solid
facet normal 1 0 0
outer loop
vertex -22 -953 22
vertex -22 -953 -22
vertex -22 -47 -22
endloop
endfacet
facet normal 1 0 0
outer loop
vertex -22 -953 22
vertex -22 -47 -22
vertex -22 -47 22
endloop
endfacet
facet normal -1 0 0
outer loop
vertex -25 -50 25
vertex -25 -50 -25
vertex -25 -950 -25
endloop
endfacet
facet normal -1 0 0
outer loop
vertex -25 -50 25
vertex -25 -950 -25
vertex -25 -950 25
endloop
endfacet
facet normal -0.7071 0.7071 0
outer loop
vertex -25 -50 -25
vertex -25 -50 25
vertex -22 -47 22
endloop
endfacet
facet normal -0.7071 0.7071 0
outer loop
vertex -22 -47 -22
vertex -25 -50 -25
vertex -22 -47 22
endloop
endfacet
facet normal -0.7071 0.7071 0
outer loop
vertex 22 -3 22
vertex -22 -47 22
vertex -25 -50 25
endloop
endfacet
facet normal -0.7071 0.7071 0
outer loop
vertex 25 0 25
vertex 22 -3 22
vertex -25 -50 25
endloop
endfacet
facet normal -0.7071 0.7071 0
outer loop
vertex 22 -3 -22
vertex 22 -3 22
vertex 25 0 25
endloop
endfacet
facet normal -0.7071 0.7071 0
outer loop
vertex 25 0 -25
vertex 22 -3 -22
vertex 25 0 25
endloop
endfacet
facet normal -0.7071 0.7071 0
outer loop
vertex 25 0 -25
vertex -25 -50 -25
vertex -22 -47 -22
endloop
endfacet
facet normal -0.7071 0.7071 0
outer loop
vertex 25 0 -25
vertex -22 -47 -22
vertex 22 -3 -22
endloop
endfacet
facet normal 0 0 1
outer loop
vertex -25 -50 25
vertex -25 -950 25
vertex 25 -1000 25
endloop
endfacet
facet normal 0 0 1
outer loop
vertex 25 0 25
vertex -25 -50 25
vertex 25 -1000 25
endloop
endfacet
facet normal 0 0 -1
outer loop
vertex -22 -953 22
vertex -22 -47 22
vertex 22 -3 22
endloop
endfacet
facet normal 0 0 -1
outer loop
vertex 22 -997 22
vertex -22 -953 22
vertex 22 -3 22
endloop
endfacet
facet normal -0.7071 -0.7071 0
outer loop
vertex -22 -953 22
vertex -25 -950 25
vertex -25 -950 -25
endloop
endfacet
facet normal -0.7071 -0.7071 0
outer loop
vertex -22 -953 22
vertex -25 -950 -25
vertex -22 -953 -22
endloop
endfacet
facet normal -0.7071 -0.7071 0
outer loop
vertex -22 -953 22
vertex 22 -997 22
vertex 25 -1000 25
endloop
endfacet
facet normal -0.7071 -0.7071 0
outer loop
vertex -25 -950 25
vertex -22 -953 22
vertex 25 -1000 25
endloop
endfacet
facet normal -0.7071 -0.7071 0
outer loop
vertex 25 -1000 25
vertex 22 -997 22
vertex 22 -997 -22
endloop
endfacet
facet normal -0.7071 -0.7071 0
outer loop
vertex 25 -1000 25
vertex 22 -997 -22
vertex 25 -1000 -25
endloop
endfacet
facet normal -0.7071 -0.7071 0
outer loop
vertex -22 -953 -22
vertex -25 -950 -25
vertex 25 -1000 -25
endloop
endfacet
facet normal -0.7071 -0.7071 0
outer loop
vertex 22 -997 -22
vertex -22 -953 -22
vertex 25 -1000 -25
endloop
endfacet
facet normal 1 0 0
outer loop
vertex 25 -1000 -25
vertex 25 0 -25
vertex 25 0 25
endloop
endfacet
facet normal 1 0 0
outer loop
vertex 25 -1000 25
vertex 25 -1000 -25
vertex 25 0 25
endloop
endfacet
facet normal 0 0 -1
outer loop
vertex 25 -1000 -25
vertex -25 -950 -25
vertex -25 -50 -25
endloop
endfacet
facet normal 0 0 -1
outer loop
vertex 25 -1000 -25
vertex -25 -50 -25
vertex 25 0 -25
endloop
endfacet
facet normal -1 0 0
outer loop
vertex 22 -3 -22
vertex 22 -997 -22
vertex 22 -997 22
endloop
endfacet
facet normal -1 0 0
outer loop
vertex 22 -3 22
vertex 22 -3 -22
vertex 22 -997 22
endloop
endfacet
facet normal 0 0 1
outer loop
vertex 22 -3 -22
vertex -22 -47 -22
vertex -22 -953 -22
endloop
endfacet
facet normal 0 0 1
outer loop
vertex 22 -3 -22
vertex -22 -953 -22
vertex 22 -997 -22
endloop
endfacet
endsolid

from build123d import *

# Parameters (mm, degrees)
F0_W        = 50
F0_H        = 50
F0_W_2      = 44
F0_H_2      = 44
F1_DEPTH    = 1000
F2_T1_DEPTH = 307.1682987966


# Not quite as in the source:
# - a fillet or chamfer that OpenCascade refuses, or shapes differently, is made with other operations: its cross-section is extruded or revolved along the edge and cut away or added


with BuildPart() as f1:
    # F0 (on Front) → F1 (new body)
    with BuildSketch(Plane.XZ):
        Rectangle(F0_W, F0_H)
        Rectangle(F0_W_2, F0_H_2, mode=Mode.SUBTRACT)
    extrude(amount=F1_DEPTH)

    # F2: chamfer of 50 on 2 edges, made by hand

    # F2_s2 → F2_t1 (cut)
    with BuildSketch(Plane.XY.offset(-153.5841493983)):
        Polygon((-25, -950), (25, -1000), (-25, -1000), align=None)
        Polygon((-25, -50), (25, 0), (-25, 0), align=None)
    extrude(amount=F2_T1_DEPTH, mode=Mode.SUBTRACT)


solid = f1.part
